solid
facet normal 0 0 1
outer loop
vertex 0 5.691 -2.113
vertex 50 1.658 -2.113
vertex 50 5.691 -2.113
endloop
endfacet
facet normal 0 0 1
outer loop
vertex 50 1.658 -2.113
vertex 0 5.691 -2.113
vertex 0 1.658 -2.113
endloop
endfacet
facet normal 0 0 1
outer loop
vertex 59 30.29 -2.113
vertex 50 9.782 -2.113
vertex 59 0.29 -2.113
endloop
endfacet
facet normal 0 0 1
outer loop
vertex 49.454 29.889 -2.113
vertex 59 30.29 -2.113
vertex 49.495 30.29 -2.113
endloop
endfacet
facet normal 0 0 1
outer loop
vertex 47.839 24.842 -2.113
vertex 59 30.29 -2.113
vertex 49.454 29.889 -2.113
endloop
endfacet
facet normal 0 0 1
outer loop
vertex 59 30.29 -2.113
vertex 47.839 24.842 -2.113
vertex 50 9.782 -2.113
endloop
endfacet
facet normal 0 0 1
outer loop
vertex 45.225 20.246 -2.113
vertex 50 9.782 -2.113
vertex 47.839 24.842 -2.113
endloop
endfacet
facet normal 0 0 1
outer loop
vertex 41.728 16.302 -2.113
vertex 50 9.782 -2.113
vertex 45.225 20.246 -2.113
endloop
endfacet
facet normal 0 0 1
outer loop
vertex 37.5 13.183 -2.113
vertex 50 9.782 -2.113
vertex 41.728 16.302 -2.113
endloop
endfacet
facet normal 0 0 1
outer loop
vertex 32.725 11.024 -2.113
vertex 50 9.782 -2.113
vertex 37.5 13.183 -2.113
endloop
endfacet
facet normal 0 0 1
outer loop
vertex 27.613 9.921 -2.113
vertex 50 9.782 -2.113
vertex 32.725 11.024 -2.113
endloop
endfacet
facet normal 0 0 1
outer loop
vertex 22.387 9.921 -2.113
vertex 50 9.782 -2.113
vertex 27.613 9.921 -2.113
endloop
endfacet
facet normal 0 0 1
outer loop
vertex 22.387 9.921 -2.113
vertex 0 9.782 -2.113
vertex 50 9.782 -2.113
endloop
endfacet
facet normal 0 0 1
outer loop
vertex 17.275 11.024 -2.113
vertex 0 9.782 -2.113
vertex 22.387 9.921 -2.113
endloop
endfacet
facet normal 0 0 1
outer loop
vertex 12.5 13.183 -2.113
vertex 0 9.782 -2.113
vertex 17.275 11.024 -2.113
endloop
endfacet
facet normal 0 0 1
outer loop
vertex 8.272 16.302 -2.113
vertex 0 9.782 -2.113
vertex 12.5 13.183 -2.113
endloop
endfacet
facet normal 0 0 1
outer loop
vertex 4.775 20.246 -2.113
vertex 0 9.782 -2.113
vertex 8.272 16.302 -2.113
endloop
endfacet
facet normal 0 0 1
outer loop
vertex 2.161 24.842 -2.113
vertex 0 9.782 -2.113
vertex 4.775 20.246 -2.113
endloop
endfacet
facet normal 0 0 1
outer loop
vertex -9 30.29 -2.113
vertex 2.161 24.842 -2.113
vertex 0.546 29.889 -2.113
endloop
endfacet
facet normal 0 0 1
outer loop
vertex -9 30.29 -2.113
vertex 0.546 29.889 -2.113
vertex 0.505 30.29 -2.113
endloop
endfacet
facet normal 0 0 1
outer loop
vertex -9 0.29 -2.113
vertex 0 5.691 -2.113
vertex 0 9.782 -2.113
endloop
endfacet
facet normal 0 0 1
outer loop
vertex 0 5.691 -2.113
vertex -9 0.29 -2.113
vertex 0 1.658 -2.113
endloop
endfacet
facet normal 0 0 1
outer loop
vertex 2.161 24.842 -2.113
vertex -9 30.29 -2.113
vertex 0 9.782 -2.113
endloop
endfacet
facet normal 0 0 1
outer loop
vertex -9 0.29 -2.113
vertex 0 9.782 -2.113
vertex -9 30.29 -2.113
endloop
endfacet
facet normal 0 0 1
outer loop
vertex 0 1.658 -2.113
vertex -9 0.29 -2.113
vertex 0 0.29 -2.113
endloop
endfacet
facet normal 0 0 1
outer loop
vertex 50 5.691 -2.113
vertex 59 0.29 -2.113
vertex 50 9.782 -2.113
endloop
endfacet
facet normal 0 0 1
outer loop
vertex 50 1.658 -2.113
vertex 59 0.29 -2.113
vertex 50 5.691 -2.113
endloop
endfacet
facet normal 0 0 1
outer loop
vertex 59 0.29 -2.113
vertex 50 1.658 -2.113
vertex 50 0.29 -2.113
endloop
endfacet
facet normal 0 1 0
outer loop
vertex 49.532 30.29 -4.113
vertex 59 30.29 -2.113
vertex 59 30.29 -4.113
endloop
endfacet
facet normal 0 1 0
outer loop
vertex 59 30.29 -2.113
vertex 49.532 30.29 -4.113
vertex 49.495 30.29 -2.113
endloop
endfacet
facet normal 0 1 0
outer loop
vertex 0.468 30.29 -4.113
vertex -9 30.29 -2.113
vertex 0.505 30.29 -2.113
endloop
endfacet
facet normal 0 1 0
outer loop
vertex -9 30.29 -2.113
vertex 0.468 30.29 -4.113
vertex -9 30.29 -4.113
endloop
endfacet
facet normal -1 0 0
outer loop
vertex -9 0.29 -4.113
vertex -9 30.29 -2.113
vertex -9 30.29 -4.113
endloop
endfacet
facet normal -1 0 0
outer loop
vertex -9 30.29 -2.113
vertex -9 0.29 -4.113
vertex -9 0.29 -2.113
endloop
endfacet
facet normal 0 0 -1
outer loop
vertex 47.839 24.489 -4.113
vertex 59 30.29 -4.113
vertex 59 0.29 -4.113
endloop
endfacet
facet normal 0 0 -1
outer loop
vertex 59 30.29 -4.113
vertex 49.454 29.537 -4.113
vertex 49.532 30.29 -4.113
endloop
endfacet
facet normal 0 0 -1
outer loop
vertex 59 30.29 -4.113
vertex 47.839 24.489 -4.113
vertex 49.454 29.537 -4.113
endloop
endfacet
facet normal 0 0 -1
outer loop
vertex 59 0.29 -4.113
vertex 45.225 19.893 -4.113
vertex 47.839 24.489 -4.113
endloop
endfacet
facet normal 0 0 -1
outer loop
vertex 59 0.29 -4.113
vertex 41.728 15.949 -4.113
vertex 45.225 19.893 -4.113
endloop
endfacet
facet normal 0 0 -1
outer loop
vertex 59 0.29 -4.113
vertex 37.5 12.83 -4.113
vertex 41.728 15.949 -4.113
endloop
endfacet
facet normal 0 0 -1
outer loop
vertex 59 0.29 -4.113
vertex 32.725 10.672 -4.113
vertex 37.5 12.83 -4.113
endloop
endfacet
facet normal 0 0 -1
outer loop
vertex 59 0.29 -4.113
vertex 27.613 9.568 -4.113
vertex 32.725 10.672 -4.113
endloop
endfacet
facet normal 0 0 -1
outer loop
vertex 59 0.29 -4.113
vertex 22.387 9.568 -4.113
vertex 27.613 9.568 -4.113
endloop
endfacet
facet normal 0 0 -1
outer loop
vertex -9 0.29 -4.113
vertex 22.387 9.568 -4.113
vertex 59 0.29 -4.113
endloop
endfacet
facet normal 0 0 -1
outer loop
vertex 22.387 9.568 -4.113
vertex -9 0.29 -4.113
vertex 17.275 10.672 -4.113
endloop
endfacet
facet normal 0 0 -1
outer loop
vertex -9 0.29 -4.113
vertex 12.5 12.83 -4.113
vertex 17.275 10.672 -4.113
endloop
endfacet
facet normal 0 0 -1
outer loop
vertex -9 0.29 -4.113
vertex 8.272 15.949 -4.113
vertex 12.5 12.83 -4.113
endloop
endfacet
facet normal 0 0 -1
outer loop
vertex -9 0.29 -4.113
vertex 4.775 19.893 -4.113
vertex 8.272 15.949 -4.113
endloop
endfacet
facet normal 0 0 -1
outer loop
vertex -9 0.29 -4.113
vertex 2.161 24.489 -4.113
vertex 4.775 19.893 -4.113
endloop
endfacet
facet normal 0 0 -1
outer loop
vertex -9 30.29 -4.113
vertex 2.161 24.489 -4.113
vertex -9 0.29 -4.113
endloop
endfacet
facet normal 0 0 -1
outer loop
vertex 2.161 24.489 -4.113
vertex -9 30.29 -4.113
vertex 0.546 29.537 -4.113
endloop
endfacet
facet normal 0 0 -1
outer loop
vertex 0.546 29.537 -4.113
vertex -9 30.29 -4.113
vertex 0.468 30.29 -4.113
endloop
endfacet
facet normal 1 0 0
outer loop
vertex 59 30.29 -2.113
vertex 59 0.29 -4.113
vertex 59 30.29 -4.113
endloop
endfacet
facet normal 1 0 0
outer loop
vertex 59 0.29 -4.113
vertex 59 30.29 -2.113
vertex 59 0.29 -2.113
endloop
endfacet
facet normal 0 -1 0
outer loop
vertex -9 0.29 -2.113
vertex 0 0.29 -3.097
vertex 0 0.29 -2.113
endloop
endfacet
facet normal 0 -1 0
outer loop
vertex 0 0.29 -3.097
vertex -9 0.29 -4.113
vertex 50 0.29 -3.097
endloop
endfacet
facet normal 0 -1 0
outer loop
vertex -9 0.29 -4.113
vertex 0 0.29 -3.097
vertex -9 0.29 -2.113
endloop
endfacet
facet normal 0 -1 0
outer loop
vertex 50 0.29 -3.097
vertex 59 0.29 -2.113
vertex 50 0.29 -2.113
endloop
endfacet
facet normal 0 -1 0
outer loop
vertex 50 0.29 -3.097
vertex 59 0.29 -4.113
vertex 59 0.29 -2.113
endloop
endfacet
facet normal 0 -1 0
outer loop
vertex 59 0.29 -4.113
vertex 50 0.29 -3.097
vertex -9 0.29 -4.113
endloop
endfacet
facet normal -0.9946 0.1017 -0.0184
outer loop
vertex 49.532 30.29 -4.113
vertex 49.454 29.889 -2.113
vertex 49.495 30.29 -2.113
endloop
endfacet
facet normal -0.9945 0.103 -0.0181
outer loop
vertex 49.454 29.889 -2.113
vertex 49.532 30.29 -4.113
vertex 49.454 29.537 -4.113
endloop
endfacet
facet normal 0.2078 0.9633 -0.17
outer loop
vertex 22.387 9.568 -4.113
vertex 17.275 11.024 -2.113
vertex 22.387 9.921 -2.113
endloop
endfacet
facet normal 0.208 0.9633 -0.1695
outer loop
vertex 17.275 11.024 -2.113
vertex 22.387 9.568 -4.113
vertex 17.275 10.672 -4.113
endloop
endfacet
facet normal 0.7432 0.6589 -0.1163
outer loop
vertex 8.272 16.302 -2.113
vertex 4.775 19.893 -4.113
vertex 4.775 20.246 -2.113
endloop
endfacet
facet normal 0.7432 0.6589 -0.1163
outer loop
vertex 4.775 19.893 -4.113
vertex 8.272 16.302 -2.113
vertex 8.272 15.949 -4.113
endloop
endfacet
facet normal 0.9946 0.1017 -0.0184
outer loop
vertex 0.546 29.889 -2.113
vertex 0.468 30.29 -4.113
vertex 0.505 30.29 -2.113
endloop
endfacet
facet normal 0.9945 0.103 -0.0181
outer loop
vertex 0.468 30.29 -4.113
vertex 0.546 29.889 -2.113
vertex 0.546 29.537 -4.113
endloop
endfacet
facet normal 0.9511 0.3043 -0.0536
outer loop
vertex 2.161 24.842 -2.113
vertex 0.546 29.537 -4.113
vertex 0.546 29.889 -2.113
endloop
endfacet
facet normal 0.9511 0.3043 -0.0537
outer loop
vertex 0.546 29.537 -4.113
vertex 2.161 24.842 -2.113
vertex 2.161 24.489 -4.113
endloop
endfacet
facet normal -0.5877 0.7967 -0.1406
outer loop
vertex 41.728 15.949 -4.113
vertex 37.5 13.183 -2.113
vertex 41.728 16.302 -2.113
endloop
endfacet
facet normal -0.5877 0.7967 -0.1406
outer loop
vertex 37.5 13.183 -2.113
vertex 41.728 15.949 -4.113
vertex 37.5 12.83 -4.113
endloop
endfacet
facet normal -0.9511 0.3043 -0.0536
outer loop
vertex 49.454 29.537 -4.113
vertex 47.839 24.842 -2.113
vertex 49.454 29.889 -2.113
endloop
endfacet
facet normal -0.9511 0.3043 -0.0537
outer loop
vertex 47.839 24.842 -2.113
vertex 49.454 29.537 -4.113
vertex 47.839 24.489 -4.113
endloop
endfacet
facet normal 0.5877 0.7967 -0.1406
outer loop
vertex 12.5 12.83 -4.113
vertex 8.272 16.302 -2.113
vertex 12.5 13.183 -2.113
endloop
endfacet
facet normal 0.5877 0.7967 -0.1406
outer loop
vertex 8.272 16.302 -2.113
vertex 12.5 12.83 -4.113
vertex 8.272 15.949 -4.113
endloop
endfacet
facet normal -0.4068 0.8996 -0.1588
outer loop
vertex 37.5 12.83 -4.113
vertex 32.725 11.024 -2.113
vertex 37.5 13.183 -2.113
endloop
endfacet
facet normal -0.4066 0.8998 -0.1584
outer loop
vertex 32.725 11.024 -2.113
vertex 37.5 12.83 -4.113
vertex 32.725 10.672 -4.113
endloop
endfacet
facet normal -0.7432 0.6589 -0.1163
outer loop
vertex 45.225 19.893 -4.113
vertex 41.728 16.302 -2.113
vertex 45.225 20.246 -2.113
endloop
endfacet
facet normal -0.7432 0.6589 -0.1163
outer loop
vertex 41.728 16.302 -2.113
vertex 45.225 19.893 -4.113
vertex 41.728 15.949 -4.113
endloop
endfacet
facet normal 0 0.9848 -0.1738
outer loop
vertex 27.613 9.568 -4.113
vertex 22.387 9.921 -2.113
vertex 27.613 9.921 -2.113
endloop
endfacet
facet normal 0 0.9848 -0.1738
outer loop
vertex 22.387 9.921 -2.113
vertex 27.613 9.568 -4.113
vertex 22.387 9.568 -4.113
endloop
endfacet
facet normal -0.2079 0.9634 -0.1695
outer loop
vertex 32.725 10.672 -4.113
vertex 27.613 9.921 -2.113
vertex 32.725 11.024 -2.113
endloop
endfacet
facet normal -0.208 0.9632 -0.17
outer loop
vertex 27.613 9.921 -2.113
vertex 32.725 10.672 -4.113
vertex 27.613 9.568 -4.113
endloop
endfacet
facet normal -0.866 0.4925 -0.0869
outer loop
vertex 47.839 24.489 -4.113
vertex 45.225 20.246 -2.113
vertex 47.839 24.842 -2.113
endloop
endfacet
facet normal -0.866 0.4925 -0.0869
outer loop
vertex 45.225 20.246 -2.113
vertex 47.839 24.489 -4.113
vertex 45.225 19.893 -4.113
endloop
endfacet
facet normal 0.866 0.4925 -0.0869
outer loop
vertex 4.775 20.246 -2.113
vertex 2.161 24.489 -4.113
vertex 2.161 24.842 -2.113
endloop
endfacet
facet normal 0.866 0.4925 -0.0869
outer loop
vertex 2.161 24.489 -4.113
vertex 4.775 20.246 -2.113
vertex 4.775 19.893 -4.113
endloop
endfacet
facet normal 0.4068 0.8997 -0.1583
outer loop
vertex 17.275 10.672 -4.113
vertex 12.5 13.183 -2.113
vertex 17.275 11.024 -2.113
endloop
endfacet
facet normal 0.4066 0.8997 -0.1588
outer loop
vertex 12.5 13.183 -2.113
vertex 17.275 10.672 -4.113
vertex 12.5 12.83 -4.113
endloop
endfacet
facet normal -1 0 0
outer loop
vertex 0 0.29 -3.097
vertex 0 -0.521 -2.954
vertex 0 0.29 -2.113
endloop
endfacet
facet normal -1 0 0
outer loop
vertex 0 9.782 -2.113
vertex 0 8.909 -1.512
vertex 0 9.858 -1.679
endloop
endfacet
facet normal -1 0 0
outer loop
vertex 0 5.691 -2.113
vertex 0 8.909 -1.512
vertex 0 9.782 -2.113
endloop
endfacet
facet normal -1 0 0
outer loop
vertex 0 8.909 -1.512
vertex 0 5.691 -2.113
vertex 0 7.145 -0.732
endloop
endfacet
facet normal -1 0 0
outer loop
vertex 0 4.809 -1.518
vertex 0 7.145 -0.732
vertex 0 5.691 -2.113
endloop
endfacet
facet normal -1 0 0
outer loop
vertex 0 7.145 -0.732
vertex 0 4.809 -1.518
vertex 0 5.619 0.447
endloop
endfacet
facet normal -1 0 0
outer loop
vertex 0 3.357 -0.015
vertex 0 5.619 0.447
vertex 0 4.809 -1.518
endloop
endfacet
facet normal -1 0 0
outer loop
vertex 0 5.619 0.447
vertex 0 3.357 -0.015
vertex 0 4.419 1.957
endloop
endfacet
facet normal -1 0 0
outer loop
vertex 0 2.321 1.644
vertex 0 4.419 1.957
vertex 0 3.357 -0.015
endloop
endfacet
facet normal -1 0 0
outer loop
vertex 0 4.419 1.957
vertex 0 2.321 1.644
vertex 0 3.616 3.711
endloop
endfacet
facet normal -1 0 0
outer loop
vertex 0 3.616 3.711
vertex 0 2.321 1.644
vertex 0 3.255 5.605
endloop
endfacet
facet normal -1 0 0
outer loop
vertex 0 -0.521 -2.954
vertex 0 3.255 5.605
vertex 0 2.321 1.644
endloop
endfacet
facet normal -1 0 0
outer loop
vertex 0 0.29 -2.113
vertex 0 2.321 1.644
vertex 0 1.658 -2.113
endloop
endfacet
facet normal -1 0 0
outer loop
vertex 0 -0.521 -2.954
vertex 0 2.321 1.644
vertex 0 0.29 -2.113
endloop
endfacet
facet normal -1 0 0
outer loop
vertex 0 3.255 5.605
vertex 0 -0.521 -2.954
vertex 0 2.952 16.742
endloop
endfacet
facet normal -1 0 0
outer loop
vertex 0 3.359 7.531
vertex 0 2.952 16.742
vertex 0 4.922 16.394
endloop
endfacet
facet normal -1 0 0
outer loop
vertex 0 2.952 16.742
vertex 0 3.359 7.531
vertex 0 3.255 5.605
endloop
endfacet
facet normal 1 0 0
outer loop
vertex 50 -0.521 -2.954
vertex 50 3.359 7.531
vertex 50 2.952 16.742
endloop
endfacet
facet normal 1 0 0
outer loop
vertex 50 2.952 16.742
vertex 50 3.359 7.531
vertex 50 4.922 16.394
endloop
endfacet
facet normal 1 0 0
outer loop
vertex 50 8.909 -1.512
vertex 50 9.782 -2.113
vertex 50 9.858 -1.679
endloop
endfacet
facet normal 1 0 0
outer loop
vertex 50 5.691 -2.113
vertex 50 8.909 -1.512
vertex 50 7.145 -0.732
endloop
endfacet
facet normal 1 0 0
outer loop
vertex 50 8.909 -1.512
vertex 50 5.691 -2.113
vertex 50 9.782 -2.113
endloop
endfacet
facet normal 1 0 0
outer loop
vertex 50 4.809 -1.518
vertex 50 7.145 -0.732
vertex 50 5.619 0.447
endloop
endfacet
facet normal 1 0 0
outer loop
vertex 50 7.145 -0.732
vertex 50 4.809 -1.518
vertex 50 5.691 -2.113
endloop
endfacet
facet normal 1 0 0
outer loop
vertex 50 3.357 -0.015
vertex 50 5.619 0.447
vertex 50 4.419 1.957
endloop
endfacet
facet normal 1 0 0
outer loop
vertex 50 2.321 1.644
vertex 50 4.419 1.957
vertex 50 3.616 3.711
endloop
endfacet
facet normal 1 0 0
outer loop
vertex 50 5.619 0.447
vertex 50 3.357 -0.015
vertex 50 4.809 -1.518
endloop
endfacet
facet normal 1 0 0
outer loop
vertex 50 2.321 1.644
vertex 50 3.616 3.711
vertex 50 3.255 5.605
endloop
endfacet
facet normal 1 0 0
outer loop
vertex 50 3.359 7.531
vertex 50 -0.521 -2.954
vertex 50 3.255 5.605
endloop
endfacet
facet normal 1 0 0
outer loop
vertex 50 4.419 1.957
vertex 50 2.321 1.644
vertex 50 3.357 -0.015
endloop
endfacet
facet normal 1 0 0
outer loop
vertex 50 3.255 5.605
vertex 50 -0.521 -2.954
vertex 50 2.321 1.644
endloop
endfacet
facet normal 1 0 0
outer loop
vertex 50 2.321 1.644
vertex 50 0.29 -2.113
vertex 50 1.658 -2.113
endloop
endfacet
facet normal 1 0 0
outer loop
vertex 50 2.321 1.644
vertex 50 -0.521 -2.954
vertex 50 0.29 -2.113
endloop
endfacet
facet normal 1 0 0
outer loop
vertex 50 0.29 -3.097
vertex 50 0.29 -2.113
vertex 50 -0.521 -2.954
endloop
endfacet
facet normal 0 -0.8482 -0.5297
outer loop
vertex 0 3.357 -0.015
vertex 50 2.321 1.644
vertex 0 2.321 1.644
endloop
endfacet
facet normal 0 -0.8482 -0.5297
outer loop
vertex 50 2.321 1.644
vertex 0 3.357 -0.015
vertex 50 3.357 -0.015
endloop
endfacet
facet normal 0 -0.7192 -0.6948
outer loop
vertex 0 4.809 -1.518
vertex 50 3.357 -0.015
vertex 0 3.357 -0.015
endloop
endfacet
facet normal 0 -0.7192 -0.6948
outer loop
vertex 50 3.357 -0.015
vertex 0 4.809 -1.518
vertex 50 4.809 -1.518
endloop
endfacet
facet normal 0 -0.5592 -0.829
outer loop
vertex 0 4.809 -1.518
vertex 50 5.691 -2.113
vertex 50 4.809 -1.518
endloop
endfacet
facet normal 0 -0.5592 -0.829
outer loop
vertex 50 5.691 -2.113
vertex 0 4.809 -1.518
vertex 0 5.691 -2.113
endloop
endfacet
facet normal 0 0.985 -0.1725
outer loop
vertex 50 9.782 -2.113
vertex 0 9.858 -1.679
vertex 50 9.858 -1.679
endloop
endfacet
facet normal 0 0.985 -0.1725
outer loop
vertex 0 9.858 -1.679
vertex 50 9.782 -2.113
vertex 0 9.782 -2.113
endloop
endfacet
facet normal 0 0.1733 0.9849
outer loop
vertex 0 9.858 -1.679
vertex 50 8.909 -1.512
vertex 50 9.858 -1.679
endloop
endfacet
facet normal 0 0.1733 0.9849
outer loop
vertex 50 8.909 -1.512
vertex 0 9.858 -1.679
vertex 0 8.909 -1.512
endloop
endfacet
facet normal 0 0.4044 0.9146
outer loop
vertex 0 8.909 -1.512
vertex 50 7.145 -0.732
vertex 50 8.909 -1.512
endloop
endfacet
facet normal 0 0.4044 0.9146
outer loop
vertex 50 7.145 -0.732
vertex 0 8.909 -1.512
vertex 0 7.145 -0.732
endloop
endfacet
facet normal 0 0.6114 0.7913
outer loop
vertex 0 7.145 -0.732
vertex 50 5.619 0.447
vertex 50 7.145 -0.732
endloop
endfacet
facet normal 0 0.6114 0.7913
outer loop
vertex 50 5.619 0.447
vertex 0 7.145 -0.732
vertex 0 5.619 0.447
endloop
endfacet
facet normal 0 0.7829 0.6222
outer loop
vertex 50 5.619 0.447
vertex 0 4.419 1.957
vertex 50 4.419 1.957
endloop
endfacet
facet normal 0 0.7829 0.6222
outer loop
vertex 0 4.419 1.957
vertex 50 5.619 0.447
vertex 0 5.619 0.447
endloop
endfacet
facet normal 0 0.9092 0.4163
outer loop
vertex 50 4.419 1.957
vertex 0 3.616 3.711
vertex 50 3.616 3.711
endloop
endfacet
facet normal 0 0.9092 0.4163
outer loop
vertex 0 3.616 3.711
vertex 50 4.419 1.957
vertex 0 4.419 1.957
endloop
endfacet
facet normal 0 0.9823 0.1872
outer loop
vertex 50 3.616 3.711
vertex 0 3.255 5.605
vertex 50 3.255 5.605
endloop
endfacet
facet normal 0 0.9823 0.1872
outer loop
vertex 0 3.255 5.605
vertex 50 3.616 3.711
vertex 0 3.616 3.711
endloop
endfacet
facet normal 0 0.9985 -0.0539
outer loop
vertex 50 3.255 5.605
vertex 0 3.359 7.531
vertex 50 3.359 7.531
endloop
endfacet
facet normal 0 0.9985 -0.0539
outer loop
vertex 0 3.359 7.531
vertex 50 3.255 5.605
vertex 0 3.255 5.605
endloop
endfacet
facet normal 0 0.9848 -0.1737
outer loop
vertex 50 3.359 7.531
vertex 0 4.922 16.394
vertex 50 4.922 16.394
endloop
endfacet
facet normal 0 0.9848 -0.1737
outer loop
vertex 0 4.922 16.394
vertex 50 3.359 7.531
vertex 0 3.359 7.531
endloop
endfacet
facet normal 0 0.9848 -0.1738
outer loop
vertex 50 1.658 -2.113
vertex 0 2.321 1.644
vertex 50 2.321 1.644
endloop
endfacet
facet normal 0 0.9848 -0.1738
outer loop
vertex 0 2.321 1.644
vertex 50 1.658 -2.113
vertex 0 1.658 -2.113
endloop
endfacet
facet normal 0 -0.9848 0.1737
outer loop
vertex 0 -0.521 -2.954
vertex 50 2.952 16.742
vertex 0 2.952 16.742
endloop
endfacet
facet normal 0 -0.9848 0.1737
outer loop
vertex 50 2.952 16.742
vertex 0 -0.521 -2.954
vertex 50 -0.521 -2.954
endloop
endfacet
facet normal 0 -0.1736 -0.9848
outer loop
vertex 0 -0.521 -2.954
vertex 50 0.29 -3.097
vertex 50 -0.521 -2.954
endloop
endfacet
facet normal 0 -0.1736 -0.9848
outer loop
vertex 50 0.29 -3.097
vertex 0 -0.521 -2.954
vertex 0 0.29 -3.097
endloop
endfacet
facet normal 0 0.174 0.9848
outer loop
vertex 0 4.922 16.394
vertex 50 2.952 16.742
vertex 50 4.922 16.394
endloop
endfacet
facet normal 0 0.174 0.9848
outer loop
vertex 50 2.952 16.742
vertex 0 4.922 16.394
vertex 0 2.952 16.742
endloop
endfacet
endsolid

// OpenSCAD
/*
I like making clocks faces from computer "junk", and then buying a clock mechanism. (You need one with a long axis)
Open up a broken laptop hard drive. The shiney platter makes for an interesting clock face.
This stand screws to the back of the hard drive.

The hard part is drilling the hole through the middle of the drive.
*/

length = 68;
base_length = 50;
thickness = 2;
curve = 10;

module stand()
{
    translate( [0,-8,10] )
    rotate( [0,90,0] ) {
        linear_extrude( base_length, convexity=10 ) {
            intersection() {
                difference() {
                    circle( curve );
                    circle( curve - thickness );
                }
                square( [10,10] );
            }
        }
    }

    translate([0,-17,0]) cube( [ base_length, 20, thickness ] );

    difference() {
        translate([0,4,1]) rotate( [100,0,0] ) translate([ -(length-base_length)/2, 0, 0 ] ) cube( [ length, 30, thickness ] );
        rotate( [90,0,0] ) translate([base_length/2,35,-4]) cylinder( d=base_length, h=thickness*4 );
    }    
}

rotate( [-100,0,0] ) stand();
